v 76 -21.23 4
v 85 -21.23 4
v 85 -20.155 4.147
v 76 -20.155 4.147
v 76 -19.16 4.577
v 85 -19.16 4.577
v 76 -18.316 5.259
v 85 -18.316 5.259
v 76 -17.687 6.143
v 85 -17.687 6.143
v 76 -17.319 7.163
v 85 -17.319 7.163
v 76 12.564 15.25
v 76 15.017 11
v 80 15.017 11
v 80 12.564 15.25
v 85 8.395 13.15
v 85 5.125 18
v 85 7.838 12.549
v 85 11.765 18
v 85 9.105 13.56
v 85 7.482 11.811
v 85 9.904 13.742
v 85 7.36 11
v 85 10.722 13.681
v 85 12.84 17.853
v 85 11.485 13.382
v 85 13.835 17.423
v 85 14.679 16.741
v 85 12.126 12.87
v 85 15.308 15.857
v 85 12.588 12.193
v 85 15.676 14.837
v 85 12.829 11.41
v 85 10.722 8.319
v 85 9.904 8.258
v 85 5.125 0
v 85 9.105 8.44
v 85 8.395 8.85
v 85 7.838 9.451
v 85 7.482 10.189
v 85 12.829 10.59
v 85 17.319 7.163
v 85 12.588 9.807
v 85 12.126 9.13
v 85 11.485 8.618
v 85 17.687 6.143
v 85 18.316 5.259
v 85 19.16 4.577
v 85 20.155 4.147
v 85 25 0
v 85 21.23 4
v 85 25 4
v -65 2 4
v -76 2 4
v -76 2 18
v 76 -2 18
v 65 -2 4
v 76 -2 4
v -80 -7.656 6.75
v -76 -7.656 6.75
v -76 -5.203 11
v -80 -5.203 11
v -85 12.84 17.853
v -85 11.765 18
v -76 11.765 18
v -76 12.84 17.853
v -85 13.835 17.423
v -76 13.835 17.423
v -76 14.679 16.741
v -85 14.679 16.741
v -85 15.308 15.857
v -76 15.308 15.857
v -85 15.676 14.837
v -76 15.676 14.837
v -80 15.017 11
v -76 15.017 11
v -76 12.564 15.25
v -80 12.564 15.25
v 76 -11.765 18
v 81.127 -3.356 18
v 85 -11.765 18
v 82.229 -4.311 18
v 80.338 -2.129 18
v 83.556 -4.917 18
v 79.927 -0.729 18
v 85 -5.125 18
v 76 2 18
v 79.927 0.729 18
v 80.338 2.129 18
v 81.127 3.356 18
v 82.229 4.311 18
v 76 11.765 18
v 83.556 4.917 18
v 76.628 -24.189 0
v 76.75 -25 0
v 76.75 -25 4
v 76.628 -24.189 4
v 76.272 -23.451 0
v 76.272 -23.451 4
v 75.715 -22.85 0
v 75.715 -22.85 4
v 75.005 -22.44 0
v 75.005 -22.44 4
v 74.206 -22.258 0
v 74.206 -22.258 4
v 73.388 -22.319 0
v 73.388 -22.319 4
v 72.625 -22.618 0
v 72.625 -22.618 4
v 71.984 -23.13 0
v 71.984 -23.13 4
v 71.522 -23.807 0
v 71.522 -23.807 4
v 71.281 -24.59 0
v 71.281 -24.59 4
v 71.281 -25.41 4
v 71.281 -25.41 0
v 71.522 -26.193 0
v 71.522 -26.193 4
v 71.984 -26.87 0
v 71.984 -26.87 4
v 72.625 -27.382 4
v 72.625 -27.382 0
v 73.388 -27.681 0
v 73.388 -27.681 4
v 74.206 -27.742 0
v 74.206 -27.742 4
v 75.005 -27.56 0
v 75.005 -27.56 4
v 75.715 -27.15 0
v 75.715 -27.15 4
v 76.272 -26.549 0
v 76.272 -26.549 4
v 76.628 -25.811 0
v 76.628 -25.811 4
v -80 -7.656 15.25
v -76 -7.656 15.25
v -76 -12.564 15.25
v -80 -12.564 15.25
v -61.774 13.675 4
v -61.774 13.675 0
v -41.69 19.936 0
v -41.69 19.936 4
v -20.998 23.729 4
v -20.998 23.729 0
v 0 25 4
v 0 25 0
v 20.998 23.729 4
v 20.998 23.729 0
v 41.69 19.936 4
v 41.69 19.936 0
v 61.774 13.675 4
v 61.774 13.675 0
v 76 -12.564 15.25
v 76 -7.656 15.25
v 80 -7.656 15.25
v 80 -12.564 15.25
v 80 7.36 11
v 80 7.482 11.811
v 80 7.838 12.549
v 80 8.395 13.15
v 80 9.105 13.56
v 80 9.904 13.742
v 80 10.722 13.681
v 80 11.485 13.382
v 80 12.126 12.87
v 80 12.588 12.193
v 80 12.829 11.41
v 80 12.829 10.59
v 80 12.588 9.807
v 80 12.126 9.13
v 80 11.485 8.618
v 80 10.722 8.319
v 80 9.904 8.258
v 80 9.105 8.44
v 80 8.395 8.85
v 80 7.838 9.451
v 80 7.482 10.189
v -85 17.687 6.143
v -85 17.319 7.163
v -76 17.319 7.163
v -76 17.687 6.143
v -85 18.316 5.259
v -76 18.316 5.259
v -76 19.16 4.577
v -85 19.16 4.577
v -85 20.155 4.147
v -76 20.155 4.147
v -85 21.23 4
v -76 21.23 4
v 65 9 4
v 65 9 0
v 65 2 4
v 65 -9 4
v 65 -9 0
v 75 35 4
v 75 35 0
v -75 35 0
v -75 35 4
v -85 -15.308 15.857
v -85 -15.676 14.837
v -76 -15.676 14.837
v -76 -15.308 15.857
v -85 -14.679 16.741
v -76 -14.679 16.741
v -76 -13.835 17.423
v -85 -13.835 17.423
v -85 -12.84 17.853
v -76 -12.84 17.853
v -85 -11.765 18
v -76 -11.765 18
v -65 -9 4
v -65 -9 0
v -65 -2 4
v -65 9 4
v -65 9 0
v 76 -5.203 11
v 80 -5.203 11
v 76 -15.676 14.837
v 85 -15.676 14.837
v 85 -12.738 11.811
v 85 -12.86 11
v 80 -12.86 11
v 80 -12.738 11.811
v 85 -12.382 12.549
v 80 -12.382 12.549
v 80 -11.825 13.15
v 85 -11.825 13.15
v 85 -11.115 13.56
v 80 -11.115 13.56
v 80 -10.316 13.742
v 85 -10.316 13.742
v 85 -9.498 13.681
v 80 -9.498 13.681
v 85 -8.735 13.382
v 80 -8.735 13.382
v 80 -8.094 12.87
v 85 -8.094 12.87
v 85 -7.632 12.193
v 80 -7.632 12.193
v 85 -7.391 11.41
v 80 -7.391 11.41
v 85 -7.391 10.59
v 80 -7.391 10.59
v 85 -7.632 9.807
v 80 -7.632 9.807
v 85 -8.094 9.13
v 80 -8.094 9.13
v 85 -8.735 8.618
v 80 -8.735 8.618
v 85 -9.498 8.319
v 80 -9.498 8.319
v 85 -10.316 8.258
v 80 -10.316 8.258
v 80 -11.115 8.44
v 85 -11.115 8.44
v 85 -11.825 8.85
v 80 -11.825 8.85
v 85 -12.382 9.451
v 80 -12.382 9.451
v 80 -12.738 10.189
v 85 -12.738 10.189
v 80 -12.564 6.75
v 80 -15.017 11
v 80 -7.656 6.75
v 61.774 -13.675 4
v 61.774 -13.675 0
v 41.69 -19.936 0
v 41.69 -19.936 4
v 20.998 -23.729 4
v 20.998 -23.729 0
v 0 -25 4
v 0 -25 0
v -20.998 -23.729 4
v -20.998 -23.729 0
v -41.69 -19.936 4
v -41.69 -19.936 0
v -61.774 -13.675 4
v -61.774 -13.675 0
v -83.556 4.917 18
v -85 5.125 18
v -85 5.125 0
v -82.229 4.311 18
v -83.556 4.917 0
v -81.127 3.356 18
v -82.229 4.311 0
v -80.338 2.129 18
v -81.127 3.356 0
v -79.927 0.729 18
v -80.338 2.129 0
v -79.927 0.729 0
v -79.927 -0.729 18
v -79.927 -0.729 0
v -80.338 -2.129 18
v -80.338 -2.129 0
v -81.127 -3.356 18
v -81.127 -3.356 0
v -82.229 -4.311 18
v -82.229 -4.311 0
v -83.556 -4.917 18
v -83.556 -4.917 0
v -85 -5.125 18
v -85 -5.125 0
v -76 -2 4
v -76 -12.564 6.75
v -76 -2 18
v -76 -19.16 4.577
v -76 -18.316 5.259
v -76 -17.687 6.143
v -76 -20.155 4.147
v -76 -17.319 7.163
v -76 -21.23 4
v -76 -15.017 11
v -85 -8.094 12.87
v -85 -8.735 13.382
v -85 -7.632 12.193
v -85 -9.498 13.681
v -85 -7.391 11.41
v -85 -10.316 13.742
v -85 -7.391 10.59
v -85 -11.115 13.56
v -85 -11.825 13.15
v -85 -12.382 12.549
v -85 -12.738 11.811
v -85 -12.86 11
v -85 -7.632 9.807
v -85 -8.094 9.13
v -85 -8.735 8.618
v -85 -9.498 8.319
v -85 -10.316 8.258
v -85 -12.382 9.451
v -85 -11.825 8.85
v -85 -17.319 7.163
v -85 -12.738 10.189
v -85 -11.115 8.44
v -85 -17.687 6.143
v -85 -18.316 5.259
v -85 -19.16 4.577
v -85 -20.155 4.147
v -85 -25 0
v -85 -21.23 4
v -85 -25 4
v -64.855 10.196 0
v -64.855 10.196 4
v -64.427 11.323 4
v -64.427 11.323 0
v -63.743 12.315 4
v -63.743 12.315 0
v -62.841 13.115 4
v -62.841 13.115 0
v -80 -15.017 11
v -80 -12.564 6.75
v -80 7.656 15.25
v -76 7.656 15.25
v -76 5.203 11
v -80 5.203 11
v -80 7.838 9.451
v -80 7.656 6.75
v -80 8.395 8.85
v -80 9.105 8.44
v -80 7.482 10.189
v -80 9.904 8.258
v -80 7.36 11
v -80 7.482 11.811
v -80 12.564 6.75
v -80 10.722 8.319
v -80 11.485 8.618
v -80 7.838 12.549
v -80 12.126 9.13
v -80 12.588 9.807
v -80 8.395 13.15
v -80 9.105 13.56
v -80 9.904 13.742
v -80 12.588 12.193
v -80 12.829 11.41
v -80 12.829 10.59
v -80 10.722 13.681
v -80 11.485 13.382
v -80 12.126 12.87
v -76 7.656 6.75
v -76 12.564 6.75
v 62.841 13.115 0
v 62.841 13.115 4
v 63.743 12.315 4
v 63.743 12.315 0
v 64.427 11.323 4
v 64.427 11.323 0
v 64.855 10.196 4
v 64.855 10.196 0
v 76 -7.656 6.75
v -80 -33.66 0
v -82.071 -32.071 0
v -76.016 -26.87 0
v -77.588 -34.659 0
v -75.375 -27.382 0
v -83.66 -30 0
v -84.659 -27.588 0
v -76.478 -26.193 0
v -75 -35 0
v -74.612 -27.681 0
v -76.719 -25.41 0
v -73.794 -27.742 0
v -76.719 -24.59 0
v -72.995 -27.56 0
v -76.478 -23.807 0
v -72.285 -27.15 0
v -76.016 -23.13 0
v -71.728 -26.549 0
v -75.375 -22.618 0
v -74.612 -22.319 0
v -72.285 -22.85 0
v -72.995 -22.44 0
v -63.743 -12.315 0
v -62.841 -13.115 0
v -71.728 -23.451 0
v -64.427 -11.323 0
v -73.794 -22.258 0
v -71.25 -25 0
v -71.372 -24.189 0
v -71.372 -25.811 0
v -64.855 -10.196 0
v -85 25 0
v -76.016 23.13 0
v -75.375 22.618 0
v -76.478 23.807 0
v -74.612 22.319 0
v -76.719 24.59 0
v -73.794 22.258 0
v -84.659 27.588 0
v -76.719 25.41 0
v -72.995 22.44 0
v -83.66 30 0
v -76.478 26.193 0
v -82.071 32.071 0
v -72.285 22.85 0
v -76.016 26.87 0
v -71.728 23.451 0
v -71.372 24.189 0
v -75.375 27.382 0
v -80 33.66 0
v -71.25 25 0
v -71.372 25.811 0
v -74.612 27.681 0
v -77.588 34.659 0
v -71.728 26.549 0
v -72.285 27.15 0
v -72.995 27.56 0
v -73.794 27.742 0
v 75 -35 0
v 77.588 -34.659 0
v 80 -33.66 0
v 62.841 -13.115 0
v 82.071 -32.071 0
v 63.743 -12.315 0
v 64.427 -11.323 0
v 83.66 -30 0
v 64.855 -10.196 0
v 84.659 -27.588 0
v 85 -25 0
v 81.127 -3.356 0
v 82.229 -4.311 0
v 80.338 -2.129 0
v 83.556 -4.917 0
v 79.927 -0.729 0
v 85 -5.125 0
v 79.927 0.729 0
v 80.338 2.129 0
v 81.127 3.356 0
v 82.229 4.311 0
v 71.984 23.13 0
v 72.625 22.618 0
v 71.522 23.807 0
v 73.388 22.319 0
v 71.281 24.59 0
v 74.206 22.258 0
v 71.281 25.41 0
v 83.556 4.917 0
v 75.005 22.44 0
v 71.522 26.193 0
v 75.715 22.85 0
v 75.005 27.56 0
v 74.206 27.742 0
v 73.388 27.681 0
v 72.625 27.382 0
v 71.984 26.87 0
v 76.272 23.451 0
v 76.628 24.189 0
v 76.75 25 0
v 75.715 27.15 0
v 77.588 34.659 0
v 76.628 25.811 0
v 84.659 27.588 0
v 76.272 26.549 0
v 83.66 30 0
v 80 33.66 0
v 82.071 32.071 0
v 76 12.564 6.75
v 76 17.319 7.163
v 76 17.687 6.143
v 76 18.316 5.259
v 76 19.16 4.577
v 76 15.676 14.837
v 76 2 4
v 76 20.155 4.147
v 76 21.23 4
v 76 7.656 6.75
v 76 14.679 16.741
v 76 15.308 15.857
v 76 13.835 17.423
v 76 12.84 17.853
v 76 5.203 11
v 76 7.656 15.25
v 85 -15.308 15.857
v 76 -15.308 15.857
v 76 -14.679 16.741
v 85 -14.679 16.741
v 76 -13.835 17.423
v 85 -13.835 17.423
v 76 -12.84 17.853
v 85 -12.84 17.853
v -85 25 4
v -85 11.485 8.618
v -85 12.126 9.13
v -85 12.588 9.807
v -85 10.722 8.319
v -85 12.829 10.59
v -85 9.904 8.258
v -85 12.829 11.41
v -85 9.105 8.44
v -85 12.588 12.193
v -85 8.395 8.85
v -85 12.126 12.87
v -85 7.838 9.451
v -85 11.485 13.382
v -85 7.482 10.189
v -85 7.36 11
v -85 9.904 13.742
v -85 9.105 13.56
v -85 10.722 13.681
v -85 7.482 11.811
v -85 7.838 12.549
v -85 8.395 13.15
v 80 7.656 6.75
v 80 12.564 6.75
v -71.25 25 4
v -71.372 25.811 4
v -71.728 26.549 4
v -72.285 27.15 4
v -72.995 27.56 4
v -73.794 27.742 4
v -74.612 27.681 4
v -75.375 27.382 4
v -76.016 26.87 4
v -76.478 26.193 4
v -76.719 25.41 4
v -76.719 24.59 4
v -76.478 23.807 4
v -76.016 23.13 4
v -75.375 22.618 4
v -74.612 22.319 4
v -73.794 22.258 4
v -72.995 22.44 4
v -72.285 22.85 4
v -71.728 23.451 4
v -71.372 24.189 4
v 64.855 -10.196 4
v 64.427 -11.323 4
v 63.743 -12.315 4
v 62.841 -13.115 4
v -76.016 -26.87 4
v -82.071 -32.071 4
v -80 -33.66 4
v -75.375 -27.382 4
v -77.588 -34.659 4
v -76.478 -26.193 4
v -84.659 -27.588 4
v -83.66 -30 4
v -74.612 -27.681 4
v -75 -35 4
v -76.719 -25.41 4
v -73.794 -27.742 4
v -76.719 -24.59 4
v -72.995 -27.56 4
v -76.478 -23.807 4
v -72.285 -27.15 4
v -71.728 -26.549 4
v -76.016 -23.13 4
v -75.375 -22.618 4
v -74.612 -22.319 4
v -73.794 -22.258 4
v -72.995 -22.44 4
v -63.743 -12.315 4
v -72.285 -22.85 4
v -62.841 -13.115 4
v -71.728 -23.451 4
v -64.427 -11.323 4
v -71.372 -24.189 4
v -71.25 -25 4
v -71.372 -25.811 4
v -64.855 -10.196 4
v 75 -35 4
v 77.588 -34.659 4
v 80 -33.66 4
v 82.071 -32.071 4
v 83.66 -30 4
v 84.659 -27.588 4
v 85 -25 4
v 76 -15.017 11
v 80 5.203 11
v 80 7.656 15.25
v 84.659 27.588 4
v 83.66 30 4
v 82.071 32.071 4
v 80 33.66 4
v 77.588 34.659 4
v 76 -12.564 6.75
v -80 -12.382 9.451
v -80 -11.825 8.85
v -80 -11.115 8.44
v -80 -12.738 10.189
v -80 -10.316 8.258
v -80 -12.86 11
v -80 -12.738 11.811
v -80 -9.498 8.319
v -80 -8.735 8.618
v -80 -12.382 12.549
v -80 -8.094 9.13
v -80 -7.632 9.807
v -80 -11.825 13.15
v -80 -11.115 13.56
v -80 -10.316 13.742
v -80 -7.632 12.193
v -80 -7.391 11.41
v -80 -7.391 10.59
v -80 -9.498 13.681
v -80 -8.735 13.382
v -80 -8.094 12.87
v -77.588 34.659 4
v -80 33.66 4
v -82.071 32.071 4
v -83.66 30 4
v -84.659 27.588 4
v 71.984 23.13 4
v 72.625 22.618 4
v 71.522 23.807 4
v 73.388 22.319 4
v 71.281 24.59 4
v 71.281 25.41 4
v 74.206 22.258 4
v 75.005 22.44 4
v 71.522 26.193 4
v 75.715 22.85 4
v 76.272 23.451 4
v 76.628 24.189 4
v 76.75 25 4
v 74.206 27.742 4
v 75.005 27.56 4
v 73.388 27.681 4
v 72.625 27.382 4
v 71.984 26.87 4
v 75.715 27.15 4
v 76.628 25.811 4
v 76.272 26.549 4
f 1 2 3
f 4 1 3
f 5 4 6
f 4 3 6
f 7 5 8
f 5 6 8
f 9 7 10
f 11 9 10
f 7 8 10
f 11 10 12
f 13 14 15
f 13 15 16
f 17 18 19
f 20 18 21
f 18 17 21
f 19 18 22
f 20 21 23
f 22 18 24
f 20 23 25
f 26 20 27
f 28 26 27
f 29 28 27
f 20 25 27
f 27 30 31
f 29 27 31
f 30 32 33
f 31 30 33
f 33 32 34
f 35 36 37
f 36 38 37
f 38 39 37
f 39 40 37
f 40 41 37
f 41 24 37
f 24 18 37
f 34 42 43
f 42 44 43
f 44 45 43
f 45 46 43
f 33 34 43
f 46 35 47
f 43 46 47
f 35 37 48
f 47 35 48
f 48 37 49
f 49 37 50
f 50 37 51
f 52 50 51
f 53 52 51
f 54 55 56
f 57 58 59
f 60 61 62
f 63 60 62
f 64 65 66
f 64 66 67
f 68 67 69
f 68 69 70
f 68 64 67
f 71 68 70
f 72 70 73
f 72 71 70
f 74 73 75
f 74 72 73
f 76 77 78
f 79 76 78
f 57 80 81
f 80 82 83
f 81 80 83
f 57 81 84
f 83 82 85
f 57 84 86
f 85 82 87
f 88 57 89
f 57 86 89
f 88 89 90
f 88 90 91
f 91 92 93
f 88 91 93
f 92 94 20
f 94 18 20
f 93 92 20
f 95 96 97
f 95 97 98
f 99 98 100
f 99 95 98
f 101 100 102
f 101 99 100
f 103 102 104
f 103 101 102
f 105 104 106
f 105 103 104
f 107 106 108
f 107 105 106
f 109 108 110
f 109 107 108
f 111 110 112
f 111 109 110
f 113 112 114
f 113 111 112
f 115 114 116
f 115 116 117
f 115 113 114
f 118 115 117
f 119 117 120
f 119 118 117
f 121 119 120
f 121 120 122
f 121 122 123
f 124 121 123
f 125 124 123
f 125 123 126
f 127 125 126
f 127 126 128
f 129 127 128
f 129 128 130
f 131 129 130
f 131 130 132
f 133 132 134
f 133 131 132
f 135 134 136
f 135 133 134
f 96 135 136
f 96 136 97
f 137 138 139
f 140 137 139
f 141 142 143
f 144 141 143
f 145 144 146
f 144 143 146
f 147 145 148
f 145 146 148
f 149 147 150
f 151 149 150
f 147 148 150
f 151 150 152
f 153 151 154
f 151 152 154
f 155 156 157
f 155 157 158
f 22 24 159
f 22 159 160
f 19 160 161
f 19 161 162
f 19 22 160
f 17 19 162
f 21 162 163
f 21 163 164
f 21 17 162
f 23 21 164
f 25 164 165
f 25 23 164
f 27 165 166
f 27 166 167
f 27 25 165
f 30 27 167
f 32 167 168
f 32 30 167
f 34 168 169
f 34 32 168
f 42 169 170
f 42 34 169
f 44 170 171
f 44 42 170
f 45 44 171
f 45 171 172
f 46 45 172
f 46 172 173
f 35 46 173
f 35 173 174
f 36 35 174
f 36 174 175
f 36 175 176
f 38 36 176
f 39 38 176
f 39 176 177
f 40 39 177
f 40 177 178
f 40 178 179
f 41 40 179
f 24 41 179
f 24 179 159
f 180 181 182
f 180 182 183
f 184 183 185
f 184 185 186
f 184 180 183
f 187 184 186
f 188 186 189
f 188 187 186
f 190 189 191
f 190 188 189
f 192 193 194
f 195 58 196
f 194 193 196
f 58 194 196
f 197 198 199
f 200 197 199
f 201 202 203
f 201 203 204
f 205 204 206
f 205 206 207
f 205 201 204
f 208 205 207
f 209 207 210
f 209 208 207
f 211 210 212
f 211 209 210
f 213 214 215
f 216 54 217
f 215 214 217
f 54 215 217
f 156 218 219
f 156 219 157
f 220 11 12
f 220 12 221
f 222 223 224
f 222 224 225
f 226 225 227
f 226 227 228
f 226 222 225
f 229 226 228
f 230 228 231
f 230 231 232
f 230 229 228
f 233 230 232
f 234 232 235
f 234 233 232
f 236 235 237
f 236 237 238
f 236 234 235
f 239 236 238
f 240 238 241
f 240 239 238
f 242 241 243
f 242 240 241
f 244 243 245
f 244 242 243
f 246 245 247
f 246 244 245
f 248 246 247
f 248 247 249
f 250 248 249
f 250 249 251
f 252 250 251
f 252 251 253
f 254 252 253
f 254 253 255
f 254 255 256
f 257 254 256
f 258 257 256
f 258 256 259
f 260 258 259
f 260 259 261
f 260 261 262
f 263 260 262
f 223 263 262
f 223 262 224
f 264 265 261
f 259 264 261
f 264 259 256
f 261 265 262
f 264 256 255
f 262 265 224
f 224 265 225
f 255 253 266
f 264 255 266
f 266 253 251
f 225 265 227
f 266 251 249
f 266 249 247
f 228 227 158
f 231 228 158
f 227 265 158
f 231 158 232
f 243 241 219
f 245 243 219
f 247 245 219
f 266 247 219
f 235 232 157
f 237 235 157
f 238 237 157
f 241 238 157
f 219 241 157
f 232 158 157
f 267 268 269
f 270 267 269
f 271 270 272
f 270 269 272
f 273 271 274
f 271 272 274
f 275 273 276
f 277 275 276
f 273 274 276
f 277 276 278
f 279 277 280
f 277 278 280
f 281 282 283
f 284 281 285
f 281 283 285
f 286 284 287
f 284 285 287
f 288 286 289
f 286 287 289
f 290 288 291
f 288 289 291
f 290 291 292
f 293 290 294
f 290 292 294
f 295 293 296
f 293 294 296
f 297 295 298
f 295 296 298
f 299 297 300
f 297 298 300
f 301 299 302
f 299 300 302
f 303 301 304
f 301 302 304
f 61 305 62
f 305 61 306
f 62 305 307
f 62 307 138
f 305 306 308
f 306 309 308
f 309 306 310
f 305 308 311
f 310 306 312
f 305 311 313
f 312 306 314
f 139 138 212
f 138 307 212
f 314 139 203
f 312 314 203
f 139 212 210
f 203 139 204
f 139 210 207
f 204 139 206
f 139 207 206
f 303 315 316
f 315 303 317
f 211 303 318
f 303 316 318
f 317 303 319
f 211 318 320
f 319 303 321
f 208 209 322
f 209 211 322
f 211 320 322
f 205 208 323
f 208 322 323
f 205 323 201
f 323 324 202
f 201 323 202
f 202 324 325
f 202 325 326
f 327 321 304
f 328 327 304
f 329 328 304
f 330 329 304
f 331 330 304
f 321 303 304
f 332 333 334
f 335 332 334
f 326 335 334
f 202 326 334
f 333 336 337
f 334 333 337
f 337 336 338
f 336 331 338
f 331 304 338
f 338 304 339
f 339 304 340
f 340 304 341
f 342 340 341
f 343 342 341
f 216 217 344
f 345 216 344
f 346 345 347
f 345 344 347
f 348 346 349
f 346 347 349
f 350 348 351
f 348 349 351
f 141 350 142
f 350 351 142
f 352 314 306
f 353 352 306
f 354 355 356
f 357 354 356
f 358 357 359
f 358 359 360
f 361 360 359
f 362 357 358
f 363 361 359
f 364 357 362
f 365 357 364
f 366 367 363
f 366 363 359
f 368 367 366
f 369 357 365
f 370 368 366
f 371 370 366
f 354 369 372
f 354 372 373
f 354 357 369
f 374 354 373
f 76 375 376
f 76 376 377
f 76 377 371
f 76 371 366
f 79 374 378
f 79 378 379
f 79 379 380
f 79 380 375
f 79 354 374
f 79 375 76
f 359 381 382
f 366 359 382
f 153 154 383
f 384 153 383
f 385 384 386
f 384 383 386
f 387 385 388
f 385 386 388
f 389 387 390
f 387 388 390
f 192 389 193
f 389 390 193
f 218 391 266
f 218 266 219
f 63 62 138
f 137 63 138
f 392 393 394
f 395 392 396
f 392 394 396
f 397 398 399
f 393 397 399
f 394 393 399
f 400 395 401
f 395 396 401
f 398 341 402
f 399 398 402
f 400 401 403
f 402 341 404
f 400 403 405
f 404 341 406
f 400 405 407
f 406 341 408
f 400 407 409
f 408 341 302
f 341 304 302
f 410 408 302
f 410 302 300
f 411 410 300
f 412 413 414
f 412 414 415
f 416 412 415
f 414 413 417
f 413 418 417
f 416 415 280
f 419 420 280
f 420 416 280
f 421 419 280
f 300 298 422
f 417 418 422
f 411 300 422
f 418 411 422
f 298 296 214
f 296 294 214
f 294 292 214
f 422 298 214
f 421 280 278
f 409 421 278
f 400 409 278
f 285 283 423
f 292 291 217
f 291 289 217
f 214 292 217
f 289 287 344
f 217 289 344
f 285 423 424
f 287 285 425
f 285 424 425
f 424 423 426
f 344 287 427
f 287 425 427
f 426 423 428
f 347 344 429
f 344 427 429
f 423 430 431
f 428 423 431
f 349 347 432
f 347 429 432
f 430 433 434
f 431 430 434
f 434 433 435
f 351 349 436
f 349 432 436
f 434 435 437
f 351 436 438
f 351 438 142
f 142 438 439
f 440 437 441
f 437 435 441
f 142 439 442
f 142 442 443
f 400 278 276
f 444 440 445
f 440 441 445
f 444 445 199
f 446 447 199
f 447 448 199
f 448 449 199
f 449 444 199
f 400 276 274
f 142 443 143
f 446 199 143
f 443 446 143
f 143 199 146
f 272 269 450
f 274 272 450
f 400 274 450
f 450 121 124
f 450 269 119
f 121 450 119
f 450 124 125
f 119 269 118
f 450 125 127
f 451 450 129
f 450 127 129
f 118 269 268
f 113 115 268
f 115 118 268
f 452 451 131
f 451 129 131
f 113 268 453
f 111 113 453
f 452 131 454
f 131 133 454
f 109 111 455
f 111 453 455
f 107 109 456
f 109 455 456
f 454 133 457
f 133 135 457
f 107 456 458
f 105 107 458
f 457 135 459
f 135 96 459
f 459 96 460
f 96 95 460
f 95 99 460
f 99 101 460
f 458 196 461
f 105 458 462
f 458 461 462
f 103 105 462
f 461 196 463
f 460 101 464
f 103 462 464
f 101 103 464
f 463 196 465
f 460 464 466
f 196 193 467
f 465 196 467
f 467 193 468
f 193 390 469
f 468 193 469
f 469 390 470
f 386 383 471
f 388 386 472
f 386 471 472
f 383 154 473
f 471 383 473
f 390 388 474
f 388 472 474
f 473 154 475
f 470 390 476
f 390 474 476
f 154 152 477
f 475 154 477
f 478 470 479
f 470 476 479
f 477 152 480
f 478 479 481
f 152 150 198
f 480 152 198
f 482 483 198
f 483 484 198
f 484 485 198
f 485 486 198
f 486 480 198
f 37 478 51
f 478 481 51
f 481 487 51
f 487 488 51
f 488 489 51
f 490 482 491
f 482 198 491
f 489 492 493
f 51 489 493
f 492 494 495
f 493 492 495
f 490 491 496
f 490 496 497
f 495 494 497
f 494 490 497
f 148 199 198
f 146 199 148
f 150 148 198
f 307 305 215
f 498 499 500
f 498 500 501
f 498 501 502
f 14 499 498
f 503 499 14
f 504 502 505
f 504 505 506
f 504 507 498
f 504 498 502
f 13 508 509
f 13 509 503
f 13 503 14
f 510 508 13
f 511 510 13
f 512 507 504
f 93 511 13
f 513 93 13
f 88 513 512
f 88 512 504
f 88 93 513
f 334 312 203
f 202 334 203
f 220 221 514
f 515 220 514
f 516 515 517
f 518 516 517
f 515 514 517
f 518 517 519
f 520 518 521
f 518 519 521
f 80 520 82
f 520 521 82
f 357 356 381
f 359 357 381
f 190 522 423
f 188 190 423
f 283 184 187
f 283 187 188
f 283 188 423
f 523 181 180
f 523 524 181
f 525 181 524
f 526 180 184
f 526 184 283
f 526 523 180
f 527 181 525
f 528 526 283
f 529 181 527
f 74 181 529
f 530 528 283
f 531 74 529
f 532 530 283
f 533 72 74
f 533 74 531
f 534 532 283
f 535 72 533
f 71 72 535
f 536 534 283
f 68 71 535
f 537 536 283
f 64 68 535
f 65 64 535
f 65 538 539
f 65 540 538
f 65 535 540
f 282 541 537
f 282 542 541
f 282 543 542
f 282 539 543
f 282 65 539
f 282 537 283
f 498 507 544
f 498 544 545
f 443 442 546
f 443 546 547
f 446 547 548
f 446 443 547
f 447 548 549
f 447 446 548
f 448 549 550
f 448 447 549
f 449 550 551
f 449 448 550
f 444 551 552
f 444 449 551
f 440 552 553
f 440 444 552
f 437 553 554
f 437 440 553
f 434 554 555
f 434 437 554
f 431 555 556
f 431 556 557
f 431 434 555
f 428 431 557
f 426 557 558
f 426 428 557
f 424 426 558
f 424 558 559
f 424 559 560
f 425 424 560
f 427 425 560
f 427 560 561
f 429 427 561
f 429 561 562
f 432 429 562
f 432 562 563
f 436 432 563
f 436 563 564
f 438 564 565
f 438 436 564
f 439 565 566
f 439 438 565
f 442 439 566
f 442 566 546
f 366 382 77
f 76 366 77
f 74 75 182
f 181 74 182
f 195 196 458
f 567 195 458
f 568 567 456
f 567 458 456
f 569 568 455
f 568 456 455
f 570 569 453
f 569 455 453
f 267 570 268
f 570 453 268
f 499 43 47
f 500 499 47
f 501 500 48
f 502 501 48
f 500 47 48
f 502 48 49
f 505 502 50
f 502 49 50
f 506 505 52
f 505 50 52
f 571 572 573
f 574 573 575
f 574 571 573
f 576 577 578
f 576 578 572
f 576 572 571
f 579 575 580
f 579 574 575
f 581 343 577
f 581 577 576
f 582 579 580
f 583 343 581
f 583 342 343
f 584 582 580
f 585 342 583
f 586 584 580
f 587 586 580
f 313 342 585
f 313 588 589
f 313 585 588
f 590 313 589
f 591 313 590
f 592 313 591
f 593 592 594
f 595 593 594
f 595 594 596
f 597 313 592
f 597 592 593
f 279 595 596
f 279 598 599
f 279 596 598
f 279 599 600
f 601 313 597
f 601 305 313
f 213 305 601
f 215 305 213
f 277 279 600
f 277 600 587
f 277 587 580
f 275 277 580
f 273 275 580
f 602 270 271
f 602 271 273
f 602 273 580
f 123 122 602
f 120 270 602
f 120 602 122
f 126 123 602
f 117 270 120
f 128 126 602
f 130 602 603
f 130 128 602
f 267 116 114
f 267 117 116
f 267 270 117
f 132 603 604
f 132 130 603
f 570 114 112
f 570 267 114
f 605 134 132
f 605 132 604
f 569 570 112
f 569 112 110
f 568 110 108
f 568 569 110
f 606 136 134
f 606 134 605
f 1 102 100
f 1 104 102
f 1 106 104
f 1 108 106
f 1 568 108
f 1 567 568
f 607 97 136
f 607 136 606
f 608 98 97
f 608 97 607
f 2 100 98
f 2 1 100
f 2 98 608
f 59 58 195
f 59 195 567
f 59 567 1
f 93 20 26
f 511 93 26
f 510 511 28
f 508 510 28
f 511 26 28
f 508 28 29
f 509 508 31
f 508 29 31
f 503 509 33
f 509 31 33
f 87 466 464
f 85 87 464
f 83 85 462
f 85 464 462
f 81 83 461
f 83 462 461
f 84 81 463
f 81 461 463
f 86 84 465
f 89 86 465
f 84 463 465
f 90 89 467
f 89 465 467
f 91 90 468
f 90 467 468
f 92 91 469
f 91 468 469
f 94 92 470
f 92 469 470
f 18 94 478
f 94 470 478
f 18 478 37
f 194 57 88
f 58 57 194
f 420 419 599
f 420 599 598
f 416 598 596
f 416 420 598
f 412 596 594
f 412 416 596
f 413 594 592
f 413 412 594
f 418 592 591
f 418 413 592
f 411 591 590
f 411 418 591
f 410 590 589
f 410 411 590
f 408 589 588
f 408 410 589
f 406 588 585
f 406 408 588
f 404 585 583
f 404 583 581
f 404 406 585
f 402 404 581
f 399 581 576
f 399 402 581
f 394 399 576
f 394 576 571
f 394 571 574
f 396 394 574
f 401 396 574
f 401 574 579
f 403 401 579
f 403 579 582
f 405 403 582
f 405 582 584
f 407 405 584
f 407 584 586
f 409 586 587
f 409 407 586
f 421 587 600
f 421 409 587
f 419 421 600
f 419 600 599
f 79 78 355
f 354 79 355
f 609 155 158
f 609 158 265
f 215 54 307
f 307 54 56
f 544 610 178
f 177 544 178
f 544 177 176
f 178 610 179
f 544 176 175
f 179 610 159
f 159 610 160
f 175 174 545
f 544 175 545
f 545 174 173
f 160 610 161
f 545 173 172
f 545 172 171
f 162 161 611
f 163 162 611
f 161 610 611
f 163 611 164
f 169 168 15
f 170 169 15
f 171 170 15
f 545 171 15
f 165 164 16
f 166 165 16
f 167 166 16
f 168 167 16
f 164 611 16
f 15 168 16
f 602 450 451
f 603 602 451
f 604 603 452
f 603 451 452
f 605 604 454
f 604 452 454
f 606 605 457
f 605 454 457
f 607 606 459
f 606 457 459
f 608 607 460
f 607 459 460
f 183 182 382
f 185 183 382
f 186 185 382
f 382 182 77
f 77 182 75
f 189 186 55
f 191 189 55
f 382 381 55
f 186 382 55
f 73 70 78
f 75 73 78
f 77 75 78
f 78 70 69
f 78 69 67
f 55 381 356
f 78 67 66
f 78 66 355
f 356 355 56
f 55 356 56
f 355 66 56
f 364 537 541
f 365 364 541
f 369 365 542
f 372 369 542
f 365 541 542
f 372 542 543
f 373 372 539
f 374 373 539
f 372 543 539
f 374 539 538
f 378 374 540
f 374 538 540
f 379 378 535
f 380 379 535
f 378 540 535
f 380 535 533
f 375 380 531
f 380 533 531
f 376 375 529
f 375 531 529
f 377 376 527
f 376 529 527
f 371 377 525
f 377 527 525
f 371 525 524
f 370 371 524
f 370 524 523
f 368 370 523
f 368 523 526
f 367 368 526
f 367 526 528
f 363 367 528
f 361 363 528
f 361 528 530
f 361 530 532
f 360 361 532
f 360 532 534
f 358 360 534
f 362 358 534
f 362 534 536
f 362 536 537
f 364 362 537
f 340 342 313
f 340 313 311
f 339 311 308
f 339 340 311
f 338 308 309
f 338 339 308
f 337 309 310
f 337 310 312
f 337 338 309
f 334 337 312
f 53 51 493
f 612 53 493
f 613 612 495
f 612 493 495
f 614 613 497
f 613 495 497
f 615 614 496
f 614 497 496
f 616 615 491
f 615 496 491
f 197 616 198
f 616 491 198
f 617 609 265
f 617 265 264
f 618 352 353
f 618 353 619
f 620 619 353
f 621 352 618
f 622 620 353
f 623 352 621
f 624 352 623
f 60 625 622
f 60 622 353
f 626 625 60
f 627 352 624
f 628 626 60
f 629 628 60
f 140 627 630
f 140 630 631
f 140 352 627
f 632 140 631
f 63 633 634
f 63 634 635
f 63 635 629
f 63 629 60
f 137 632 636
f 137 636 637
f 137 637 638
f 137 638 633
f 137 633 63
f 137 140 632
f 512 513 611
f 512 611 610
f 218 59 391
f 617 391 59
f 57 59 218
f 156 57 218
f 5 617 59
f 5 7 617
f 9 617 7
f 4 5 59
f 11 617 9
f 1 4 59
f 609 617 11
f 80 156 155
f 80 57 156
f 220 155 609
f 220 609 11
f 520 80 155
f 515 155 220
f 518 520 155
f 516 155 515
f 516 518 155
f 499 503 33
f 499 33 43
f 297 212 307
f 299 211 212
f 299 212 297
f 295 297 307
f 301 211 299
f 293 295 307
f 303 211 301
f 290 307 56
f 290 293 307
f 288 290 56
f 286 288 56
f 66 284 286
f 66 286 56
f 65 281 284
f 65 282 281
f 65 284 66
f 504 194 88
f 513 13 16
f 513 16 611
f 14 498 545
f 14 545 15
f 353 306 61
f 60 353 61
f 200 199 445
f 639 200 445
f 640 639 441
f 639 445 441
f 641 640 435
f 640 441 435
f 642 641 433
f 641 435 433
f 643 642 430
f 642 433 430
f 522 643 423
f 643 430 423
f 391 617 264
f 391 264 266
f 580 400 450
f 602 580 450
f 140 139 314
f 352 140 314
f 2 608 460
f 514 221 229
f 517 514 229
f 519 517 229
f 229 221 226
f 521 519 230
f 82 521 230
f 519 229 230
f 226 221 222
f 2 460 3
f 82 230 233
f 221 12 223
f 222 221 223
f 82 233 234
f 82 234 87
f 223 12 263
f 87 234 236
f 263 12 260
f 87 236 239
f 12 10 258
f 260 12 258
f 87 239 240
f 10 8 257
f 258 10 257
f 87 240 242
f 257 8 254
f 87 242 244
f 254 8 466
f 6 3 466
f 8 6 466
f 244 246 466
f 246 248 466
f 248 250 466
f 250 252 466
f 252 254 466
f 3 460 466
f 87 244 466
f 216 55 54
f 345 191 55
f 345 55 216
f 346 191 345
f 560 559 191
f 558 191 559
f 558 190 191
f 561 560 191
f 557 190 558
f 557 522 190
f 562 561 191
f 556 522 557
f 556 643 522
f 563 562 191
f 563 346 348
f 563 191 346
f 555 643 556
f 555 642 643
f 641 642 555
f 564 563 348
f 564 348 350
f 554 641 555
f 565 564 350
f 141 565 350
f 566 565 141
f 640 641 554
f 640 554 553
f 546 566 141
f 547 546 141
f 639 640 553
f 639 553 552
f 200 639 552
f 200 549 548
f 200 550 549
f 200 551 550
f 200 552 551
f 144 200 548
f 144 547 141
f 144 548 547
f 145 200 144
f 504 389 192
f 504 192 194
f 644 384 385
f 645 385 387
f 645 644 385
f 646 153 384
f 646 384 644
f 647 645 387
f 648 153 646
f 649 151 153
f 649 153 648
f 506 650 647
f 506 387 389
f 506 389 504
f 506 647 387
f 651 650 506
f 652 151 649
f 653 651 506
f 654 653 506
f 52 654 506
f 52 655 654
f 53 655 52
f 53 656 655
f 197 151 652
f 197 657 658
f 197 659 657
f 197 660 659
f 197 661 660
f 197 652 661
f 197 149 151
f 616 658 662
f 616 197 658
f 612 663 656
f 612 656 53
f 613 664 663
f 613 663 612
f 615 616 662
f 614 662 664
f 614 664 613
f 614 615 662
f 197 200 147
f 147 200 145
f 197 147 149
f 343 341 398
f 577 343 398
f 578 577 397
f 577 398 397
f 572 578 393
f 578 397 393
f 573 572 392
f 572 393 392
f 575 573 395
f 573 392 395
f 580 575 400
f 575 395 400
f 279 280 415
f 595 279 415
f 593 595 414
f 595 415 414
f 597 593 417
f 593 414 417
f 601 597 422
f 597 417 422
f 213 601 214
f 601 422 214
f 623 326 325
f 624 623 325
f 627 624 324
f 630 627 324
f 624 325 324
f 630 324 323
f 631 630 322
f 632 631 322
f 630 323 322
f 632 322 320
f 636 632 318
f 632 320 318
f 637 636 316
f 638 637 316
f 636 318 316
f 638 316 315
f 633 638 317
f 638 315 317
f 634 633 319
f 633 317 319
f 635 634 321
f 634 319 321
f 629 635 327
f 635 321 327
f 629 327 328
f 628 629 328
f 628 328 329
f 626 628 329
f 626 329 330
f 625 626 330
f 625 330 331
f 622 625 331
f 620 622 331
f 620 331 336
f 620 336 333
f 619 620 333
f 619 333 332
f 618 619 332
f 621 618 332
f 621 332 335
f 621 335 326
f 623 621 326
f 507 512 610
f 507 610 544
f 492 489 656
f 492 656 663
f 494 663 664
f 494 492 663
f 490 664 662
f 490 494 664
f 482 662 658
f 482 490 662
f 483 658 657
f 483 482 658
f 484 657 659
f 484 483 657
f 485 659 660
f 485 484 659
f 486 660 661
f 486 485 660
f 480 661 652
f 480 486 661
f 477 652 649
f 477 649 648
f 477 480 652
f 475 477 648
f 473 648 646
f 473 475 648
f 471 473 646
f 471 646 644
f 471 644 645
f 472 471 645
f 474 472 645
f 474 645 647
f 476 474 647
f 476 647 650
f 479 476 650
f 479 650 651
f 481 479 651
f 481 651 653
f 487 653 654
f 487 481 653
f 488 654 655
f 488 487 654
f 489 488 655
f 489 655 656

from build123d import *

# Parameters (mm, degrees)
F0_R      = 2.75
F1_DEPTH  = 4
F2_R      = 2.75
F3_DEPTH  = 9
F5_DEPTH  = 4
F7_R      = 5.125
F8_DEPTH  = 18.001
F10_DEPTH = 2


with BuildPart() as f1:
    # F0 (on Top) → F1 (new body)
    with BuildSketch(Plane.XY):
        with BuildLine():
            ThreePointArc((85, 25), (82.071068, 32.071068), (75, 35))
            Line((75, 35), (-75, 35))
            ThreePointArc((-75, 35), (-82.071068, 32.071068), (-85, 25))
            Line((-85, 25), (-85, -25))
            ThreePointArc((-85, -25), (-82.071068, -32.071068), (-75, -35))
            Line((-75, -35), (75, -35))
            ThreePointArc((75, -35), (82.071068, -32.071068), (85, -25))
            Line((85, -25), (85, 25))
        make_face()
        with Locations((-74, -25)):
            Circle(F0_R, mode=Mode.SUBTRACT)
        with Locations((74, -25)):
            Circle(F0_R, mode=Mode.SUBTRACT)
        with BuildLine():
            ThreePointArc((61.773717, 13.674819), (64.11513, 11.840019), (65, 9))
            Line((65, 9), (65, -9))
            ThreePointArc((65, -9), (64.11513, -11.840019), (61.773717, -13.674819))
            ThreePointArc((61.773717, -13.674819), (0, -25), (-61.773717, -13.674819))
            ThreePointArc((-61.773717, -13.674819), (-64.11513, -11.840019), (-65, -9))
            Line((-65, -9), (-65, 9))
            ThreePointArc((-65, 9), (-64.11513, 11.840019), (-61.773717, 13.674819))
            ThreePointArc((-61.773717, 13.674819), (0, 25), (61.773717, 13.674819))
        make_face(mode=Mode.SUBTRACT)
        with Locations((-74, 25)):
            Circle(F0_R, mode=Mode.SUBTRACT)
        with Locations((74, 25)):
            Circle(F0_R, mode=Mode.SUBTRACT)
    extrude(amount=F1_DEPTH)

    # F6: F3 across plane


with BuildPart() as f3:
    # F2 (on face) → F3 (new body)
    with BuildSketch(Plane(origin=(-85, 0, 0), x_dir=(0, -1, 0), z_dir=(-1, 0, 0))):
        with BuildLine():
            ThreePointArc((-17.318548, 7.163017), (-18.714839, 4.8897), (-21.23, 4))
            Line((-21.23, 4), (21.23, 4))
            ThreePointArc((21.23, 4), (18.714839, 4.8897), (17.318548, 7.163017))
            Line((17.318548, 7.163017), (15.676452, 14.836983))
            ThreePointArc((15.676452, 14.836983), (14.280161, 17.1103), (11.765, 18))
            Line((11.765, 18), (-11.765, 18))
            ThreePointArc((-11.765, 18), (-14.280161, 17.1103), (-15.676452, 14.836983))
            Line((-15.676452, 14.836983), (-17.318548, 7.163017))
        make_face()
        with Locations((-10.11, 11)):
            Circle(F2_R, mode=Mode.SUBTRACT)
        with Locations((10.11, 11)):
            Circle(F2_R, mode=Mode.SUBTRACT)
    extrude(amount=-F3_DEPTH)

    # F4 (on face) → F5 (cut)
    with BuildSketch(Plane.YZ.offset(-76)):
        Polygon((-5.202523, 11), (-7.656261, 15.25), (-12.563739, 15.25), (-15.017477, 11), (-12.563739, 6.75), (-7.656261, 6.75), align=None)
        Polygon((5.202523, 11), (7.656261, 6.75), (12.563739, 6.75), (15.017477, 11), (12.563739, 15.25), (7.656261, 15.25), align=None)
    extrude(amount=-F5_DEPTH, mode=Mode.SUBTRACT)


with BuildPart() as f1_1:
    add(f1.part)
    add(f3.part.mirror(Plane.YZ))


with BuildPart() as f8_tool:
    # F7 (on face) → F8 (new body, through all)
    with BuildSketch(Plane(origin=(0, 0, 0), x_dir=(1, 0, 0), z_dir=(0, 0, -1))):
        with Locations((-85, 0)):
            Circle(F7_R)
        with Locations((85, 0)):
            Circle(F7_R)
    extrude(amount=-F8_DEPTH)


with BuildPart() as f1_2:
    add(f1_1.part)

    # F8: cut by f8_tool
    add(f8_tool.part, mode=Mode.SUBTRACT)



with BuildPart() as f3_1:
    add(f3.part)

    # F8: cut by f8_tool
    add(f8_tool.part, mode=Mode.SUBTRACT)


with BuildPart() as f1_3:
    add(f1_2.part)

    add(f3_1.part)  # F10 merges F3
    # F9 (on Front) → F10 (join, symmetric)
    with BuildSketch(Plane.XZ):
        Polygon((-65, 4), (-76, 18), (-76, 4), align=None)
        Polygon((76, 4), (76, 18), (65, 4), align=None)
    extrude(amount=F10_DEPTH, both=True)


solid = f1_3.part
